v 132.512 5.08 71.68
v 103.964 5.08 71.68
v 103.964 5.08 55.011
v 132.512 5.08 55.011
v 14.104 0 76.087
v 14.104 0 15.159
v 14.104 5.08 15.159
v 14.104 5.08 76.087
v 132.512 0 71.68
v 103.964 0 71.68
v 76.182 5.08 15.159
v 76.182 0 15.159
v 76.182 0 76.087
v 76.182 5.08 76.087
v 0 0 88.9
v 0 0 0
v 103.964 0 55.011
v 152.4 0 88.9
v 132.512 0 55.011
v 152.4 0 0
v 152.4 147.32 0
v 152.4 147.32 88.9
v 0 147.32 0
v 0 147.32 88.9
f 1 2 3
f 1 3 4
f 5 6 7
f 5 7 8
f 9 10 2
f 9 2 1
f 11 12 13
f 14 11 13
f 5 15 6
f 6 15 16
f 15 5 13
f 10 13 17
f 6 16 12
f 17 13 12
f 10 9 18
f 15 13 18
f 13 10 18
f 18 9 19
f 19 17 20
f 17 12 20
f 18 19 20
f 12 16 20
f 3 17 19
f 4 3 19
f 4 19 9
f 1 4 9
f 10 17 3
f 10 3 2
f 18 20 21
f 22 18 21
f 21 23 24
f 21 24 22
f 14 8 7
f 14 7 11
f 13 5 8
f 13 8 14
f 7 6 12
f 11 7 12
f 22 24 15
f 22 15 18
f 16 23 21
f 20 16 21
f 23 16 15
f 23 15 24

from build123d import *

# Parameters (mm, degrees)
F0_W     = 152.4
F0_H     = 147.32
F1_DEPTH = 88.9
F2_W     = 62.077993
F2_H     = 60.928402
F2_W_2   = 28.548219
F2_H_2   = 16.669087
F3_DEPTH = 5.08


with BuildPart() as f1:
    # F0 (on Top) → F1 (new body)
    with BuildSketch(Plane.XY):
        with Locations((76.2, 73.66)):
            Rectangle(F0_W, F0_H)
    extrude(amount=F1_DEPTH)

    # F2 (on face) → F3 (cut)
    with BuildSketch(Plane.XZ):
        with Locations((45.143026, 45.622946)):
            Rectangle(F2_W, F2_H)
        with Locations((118.237953, 63.34583)):
            Rectangle(F2_W_2, F2_H_2)
    extrude(amount=-F3_DEPTH, mode=Mode.SUBTRACT)


solid = f1.part
